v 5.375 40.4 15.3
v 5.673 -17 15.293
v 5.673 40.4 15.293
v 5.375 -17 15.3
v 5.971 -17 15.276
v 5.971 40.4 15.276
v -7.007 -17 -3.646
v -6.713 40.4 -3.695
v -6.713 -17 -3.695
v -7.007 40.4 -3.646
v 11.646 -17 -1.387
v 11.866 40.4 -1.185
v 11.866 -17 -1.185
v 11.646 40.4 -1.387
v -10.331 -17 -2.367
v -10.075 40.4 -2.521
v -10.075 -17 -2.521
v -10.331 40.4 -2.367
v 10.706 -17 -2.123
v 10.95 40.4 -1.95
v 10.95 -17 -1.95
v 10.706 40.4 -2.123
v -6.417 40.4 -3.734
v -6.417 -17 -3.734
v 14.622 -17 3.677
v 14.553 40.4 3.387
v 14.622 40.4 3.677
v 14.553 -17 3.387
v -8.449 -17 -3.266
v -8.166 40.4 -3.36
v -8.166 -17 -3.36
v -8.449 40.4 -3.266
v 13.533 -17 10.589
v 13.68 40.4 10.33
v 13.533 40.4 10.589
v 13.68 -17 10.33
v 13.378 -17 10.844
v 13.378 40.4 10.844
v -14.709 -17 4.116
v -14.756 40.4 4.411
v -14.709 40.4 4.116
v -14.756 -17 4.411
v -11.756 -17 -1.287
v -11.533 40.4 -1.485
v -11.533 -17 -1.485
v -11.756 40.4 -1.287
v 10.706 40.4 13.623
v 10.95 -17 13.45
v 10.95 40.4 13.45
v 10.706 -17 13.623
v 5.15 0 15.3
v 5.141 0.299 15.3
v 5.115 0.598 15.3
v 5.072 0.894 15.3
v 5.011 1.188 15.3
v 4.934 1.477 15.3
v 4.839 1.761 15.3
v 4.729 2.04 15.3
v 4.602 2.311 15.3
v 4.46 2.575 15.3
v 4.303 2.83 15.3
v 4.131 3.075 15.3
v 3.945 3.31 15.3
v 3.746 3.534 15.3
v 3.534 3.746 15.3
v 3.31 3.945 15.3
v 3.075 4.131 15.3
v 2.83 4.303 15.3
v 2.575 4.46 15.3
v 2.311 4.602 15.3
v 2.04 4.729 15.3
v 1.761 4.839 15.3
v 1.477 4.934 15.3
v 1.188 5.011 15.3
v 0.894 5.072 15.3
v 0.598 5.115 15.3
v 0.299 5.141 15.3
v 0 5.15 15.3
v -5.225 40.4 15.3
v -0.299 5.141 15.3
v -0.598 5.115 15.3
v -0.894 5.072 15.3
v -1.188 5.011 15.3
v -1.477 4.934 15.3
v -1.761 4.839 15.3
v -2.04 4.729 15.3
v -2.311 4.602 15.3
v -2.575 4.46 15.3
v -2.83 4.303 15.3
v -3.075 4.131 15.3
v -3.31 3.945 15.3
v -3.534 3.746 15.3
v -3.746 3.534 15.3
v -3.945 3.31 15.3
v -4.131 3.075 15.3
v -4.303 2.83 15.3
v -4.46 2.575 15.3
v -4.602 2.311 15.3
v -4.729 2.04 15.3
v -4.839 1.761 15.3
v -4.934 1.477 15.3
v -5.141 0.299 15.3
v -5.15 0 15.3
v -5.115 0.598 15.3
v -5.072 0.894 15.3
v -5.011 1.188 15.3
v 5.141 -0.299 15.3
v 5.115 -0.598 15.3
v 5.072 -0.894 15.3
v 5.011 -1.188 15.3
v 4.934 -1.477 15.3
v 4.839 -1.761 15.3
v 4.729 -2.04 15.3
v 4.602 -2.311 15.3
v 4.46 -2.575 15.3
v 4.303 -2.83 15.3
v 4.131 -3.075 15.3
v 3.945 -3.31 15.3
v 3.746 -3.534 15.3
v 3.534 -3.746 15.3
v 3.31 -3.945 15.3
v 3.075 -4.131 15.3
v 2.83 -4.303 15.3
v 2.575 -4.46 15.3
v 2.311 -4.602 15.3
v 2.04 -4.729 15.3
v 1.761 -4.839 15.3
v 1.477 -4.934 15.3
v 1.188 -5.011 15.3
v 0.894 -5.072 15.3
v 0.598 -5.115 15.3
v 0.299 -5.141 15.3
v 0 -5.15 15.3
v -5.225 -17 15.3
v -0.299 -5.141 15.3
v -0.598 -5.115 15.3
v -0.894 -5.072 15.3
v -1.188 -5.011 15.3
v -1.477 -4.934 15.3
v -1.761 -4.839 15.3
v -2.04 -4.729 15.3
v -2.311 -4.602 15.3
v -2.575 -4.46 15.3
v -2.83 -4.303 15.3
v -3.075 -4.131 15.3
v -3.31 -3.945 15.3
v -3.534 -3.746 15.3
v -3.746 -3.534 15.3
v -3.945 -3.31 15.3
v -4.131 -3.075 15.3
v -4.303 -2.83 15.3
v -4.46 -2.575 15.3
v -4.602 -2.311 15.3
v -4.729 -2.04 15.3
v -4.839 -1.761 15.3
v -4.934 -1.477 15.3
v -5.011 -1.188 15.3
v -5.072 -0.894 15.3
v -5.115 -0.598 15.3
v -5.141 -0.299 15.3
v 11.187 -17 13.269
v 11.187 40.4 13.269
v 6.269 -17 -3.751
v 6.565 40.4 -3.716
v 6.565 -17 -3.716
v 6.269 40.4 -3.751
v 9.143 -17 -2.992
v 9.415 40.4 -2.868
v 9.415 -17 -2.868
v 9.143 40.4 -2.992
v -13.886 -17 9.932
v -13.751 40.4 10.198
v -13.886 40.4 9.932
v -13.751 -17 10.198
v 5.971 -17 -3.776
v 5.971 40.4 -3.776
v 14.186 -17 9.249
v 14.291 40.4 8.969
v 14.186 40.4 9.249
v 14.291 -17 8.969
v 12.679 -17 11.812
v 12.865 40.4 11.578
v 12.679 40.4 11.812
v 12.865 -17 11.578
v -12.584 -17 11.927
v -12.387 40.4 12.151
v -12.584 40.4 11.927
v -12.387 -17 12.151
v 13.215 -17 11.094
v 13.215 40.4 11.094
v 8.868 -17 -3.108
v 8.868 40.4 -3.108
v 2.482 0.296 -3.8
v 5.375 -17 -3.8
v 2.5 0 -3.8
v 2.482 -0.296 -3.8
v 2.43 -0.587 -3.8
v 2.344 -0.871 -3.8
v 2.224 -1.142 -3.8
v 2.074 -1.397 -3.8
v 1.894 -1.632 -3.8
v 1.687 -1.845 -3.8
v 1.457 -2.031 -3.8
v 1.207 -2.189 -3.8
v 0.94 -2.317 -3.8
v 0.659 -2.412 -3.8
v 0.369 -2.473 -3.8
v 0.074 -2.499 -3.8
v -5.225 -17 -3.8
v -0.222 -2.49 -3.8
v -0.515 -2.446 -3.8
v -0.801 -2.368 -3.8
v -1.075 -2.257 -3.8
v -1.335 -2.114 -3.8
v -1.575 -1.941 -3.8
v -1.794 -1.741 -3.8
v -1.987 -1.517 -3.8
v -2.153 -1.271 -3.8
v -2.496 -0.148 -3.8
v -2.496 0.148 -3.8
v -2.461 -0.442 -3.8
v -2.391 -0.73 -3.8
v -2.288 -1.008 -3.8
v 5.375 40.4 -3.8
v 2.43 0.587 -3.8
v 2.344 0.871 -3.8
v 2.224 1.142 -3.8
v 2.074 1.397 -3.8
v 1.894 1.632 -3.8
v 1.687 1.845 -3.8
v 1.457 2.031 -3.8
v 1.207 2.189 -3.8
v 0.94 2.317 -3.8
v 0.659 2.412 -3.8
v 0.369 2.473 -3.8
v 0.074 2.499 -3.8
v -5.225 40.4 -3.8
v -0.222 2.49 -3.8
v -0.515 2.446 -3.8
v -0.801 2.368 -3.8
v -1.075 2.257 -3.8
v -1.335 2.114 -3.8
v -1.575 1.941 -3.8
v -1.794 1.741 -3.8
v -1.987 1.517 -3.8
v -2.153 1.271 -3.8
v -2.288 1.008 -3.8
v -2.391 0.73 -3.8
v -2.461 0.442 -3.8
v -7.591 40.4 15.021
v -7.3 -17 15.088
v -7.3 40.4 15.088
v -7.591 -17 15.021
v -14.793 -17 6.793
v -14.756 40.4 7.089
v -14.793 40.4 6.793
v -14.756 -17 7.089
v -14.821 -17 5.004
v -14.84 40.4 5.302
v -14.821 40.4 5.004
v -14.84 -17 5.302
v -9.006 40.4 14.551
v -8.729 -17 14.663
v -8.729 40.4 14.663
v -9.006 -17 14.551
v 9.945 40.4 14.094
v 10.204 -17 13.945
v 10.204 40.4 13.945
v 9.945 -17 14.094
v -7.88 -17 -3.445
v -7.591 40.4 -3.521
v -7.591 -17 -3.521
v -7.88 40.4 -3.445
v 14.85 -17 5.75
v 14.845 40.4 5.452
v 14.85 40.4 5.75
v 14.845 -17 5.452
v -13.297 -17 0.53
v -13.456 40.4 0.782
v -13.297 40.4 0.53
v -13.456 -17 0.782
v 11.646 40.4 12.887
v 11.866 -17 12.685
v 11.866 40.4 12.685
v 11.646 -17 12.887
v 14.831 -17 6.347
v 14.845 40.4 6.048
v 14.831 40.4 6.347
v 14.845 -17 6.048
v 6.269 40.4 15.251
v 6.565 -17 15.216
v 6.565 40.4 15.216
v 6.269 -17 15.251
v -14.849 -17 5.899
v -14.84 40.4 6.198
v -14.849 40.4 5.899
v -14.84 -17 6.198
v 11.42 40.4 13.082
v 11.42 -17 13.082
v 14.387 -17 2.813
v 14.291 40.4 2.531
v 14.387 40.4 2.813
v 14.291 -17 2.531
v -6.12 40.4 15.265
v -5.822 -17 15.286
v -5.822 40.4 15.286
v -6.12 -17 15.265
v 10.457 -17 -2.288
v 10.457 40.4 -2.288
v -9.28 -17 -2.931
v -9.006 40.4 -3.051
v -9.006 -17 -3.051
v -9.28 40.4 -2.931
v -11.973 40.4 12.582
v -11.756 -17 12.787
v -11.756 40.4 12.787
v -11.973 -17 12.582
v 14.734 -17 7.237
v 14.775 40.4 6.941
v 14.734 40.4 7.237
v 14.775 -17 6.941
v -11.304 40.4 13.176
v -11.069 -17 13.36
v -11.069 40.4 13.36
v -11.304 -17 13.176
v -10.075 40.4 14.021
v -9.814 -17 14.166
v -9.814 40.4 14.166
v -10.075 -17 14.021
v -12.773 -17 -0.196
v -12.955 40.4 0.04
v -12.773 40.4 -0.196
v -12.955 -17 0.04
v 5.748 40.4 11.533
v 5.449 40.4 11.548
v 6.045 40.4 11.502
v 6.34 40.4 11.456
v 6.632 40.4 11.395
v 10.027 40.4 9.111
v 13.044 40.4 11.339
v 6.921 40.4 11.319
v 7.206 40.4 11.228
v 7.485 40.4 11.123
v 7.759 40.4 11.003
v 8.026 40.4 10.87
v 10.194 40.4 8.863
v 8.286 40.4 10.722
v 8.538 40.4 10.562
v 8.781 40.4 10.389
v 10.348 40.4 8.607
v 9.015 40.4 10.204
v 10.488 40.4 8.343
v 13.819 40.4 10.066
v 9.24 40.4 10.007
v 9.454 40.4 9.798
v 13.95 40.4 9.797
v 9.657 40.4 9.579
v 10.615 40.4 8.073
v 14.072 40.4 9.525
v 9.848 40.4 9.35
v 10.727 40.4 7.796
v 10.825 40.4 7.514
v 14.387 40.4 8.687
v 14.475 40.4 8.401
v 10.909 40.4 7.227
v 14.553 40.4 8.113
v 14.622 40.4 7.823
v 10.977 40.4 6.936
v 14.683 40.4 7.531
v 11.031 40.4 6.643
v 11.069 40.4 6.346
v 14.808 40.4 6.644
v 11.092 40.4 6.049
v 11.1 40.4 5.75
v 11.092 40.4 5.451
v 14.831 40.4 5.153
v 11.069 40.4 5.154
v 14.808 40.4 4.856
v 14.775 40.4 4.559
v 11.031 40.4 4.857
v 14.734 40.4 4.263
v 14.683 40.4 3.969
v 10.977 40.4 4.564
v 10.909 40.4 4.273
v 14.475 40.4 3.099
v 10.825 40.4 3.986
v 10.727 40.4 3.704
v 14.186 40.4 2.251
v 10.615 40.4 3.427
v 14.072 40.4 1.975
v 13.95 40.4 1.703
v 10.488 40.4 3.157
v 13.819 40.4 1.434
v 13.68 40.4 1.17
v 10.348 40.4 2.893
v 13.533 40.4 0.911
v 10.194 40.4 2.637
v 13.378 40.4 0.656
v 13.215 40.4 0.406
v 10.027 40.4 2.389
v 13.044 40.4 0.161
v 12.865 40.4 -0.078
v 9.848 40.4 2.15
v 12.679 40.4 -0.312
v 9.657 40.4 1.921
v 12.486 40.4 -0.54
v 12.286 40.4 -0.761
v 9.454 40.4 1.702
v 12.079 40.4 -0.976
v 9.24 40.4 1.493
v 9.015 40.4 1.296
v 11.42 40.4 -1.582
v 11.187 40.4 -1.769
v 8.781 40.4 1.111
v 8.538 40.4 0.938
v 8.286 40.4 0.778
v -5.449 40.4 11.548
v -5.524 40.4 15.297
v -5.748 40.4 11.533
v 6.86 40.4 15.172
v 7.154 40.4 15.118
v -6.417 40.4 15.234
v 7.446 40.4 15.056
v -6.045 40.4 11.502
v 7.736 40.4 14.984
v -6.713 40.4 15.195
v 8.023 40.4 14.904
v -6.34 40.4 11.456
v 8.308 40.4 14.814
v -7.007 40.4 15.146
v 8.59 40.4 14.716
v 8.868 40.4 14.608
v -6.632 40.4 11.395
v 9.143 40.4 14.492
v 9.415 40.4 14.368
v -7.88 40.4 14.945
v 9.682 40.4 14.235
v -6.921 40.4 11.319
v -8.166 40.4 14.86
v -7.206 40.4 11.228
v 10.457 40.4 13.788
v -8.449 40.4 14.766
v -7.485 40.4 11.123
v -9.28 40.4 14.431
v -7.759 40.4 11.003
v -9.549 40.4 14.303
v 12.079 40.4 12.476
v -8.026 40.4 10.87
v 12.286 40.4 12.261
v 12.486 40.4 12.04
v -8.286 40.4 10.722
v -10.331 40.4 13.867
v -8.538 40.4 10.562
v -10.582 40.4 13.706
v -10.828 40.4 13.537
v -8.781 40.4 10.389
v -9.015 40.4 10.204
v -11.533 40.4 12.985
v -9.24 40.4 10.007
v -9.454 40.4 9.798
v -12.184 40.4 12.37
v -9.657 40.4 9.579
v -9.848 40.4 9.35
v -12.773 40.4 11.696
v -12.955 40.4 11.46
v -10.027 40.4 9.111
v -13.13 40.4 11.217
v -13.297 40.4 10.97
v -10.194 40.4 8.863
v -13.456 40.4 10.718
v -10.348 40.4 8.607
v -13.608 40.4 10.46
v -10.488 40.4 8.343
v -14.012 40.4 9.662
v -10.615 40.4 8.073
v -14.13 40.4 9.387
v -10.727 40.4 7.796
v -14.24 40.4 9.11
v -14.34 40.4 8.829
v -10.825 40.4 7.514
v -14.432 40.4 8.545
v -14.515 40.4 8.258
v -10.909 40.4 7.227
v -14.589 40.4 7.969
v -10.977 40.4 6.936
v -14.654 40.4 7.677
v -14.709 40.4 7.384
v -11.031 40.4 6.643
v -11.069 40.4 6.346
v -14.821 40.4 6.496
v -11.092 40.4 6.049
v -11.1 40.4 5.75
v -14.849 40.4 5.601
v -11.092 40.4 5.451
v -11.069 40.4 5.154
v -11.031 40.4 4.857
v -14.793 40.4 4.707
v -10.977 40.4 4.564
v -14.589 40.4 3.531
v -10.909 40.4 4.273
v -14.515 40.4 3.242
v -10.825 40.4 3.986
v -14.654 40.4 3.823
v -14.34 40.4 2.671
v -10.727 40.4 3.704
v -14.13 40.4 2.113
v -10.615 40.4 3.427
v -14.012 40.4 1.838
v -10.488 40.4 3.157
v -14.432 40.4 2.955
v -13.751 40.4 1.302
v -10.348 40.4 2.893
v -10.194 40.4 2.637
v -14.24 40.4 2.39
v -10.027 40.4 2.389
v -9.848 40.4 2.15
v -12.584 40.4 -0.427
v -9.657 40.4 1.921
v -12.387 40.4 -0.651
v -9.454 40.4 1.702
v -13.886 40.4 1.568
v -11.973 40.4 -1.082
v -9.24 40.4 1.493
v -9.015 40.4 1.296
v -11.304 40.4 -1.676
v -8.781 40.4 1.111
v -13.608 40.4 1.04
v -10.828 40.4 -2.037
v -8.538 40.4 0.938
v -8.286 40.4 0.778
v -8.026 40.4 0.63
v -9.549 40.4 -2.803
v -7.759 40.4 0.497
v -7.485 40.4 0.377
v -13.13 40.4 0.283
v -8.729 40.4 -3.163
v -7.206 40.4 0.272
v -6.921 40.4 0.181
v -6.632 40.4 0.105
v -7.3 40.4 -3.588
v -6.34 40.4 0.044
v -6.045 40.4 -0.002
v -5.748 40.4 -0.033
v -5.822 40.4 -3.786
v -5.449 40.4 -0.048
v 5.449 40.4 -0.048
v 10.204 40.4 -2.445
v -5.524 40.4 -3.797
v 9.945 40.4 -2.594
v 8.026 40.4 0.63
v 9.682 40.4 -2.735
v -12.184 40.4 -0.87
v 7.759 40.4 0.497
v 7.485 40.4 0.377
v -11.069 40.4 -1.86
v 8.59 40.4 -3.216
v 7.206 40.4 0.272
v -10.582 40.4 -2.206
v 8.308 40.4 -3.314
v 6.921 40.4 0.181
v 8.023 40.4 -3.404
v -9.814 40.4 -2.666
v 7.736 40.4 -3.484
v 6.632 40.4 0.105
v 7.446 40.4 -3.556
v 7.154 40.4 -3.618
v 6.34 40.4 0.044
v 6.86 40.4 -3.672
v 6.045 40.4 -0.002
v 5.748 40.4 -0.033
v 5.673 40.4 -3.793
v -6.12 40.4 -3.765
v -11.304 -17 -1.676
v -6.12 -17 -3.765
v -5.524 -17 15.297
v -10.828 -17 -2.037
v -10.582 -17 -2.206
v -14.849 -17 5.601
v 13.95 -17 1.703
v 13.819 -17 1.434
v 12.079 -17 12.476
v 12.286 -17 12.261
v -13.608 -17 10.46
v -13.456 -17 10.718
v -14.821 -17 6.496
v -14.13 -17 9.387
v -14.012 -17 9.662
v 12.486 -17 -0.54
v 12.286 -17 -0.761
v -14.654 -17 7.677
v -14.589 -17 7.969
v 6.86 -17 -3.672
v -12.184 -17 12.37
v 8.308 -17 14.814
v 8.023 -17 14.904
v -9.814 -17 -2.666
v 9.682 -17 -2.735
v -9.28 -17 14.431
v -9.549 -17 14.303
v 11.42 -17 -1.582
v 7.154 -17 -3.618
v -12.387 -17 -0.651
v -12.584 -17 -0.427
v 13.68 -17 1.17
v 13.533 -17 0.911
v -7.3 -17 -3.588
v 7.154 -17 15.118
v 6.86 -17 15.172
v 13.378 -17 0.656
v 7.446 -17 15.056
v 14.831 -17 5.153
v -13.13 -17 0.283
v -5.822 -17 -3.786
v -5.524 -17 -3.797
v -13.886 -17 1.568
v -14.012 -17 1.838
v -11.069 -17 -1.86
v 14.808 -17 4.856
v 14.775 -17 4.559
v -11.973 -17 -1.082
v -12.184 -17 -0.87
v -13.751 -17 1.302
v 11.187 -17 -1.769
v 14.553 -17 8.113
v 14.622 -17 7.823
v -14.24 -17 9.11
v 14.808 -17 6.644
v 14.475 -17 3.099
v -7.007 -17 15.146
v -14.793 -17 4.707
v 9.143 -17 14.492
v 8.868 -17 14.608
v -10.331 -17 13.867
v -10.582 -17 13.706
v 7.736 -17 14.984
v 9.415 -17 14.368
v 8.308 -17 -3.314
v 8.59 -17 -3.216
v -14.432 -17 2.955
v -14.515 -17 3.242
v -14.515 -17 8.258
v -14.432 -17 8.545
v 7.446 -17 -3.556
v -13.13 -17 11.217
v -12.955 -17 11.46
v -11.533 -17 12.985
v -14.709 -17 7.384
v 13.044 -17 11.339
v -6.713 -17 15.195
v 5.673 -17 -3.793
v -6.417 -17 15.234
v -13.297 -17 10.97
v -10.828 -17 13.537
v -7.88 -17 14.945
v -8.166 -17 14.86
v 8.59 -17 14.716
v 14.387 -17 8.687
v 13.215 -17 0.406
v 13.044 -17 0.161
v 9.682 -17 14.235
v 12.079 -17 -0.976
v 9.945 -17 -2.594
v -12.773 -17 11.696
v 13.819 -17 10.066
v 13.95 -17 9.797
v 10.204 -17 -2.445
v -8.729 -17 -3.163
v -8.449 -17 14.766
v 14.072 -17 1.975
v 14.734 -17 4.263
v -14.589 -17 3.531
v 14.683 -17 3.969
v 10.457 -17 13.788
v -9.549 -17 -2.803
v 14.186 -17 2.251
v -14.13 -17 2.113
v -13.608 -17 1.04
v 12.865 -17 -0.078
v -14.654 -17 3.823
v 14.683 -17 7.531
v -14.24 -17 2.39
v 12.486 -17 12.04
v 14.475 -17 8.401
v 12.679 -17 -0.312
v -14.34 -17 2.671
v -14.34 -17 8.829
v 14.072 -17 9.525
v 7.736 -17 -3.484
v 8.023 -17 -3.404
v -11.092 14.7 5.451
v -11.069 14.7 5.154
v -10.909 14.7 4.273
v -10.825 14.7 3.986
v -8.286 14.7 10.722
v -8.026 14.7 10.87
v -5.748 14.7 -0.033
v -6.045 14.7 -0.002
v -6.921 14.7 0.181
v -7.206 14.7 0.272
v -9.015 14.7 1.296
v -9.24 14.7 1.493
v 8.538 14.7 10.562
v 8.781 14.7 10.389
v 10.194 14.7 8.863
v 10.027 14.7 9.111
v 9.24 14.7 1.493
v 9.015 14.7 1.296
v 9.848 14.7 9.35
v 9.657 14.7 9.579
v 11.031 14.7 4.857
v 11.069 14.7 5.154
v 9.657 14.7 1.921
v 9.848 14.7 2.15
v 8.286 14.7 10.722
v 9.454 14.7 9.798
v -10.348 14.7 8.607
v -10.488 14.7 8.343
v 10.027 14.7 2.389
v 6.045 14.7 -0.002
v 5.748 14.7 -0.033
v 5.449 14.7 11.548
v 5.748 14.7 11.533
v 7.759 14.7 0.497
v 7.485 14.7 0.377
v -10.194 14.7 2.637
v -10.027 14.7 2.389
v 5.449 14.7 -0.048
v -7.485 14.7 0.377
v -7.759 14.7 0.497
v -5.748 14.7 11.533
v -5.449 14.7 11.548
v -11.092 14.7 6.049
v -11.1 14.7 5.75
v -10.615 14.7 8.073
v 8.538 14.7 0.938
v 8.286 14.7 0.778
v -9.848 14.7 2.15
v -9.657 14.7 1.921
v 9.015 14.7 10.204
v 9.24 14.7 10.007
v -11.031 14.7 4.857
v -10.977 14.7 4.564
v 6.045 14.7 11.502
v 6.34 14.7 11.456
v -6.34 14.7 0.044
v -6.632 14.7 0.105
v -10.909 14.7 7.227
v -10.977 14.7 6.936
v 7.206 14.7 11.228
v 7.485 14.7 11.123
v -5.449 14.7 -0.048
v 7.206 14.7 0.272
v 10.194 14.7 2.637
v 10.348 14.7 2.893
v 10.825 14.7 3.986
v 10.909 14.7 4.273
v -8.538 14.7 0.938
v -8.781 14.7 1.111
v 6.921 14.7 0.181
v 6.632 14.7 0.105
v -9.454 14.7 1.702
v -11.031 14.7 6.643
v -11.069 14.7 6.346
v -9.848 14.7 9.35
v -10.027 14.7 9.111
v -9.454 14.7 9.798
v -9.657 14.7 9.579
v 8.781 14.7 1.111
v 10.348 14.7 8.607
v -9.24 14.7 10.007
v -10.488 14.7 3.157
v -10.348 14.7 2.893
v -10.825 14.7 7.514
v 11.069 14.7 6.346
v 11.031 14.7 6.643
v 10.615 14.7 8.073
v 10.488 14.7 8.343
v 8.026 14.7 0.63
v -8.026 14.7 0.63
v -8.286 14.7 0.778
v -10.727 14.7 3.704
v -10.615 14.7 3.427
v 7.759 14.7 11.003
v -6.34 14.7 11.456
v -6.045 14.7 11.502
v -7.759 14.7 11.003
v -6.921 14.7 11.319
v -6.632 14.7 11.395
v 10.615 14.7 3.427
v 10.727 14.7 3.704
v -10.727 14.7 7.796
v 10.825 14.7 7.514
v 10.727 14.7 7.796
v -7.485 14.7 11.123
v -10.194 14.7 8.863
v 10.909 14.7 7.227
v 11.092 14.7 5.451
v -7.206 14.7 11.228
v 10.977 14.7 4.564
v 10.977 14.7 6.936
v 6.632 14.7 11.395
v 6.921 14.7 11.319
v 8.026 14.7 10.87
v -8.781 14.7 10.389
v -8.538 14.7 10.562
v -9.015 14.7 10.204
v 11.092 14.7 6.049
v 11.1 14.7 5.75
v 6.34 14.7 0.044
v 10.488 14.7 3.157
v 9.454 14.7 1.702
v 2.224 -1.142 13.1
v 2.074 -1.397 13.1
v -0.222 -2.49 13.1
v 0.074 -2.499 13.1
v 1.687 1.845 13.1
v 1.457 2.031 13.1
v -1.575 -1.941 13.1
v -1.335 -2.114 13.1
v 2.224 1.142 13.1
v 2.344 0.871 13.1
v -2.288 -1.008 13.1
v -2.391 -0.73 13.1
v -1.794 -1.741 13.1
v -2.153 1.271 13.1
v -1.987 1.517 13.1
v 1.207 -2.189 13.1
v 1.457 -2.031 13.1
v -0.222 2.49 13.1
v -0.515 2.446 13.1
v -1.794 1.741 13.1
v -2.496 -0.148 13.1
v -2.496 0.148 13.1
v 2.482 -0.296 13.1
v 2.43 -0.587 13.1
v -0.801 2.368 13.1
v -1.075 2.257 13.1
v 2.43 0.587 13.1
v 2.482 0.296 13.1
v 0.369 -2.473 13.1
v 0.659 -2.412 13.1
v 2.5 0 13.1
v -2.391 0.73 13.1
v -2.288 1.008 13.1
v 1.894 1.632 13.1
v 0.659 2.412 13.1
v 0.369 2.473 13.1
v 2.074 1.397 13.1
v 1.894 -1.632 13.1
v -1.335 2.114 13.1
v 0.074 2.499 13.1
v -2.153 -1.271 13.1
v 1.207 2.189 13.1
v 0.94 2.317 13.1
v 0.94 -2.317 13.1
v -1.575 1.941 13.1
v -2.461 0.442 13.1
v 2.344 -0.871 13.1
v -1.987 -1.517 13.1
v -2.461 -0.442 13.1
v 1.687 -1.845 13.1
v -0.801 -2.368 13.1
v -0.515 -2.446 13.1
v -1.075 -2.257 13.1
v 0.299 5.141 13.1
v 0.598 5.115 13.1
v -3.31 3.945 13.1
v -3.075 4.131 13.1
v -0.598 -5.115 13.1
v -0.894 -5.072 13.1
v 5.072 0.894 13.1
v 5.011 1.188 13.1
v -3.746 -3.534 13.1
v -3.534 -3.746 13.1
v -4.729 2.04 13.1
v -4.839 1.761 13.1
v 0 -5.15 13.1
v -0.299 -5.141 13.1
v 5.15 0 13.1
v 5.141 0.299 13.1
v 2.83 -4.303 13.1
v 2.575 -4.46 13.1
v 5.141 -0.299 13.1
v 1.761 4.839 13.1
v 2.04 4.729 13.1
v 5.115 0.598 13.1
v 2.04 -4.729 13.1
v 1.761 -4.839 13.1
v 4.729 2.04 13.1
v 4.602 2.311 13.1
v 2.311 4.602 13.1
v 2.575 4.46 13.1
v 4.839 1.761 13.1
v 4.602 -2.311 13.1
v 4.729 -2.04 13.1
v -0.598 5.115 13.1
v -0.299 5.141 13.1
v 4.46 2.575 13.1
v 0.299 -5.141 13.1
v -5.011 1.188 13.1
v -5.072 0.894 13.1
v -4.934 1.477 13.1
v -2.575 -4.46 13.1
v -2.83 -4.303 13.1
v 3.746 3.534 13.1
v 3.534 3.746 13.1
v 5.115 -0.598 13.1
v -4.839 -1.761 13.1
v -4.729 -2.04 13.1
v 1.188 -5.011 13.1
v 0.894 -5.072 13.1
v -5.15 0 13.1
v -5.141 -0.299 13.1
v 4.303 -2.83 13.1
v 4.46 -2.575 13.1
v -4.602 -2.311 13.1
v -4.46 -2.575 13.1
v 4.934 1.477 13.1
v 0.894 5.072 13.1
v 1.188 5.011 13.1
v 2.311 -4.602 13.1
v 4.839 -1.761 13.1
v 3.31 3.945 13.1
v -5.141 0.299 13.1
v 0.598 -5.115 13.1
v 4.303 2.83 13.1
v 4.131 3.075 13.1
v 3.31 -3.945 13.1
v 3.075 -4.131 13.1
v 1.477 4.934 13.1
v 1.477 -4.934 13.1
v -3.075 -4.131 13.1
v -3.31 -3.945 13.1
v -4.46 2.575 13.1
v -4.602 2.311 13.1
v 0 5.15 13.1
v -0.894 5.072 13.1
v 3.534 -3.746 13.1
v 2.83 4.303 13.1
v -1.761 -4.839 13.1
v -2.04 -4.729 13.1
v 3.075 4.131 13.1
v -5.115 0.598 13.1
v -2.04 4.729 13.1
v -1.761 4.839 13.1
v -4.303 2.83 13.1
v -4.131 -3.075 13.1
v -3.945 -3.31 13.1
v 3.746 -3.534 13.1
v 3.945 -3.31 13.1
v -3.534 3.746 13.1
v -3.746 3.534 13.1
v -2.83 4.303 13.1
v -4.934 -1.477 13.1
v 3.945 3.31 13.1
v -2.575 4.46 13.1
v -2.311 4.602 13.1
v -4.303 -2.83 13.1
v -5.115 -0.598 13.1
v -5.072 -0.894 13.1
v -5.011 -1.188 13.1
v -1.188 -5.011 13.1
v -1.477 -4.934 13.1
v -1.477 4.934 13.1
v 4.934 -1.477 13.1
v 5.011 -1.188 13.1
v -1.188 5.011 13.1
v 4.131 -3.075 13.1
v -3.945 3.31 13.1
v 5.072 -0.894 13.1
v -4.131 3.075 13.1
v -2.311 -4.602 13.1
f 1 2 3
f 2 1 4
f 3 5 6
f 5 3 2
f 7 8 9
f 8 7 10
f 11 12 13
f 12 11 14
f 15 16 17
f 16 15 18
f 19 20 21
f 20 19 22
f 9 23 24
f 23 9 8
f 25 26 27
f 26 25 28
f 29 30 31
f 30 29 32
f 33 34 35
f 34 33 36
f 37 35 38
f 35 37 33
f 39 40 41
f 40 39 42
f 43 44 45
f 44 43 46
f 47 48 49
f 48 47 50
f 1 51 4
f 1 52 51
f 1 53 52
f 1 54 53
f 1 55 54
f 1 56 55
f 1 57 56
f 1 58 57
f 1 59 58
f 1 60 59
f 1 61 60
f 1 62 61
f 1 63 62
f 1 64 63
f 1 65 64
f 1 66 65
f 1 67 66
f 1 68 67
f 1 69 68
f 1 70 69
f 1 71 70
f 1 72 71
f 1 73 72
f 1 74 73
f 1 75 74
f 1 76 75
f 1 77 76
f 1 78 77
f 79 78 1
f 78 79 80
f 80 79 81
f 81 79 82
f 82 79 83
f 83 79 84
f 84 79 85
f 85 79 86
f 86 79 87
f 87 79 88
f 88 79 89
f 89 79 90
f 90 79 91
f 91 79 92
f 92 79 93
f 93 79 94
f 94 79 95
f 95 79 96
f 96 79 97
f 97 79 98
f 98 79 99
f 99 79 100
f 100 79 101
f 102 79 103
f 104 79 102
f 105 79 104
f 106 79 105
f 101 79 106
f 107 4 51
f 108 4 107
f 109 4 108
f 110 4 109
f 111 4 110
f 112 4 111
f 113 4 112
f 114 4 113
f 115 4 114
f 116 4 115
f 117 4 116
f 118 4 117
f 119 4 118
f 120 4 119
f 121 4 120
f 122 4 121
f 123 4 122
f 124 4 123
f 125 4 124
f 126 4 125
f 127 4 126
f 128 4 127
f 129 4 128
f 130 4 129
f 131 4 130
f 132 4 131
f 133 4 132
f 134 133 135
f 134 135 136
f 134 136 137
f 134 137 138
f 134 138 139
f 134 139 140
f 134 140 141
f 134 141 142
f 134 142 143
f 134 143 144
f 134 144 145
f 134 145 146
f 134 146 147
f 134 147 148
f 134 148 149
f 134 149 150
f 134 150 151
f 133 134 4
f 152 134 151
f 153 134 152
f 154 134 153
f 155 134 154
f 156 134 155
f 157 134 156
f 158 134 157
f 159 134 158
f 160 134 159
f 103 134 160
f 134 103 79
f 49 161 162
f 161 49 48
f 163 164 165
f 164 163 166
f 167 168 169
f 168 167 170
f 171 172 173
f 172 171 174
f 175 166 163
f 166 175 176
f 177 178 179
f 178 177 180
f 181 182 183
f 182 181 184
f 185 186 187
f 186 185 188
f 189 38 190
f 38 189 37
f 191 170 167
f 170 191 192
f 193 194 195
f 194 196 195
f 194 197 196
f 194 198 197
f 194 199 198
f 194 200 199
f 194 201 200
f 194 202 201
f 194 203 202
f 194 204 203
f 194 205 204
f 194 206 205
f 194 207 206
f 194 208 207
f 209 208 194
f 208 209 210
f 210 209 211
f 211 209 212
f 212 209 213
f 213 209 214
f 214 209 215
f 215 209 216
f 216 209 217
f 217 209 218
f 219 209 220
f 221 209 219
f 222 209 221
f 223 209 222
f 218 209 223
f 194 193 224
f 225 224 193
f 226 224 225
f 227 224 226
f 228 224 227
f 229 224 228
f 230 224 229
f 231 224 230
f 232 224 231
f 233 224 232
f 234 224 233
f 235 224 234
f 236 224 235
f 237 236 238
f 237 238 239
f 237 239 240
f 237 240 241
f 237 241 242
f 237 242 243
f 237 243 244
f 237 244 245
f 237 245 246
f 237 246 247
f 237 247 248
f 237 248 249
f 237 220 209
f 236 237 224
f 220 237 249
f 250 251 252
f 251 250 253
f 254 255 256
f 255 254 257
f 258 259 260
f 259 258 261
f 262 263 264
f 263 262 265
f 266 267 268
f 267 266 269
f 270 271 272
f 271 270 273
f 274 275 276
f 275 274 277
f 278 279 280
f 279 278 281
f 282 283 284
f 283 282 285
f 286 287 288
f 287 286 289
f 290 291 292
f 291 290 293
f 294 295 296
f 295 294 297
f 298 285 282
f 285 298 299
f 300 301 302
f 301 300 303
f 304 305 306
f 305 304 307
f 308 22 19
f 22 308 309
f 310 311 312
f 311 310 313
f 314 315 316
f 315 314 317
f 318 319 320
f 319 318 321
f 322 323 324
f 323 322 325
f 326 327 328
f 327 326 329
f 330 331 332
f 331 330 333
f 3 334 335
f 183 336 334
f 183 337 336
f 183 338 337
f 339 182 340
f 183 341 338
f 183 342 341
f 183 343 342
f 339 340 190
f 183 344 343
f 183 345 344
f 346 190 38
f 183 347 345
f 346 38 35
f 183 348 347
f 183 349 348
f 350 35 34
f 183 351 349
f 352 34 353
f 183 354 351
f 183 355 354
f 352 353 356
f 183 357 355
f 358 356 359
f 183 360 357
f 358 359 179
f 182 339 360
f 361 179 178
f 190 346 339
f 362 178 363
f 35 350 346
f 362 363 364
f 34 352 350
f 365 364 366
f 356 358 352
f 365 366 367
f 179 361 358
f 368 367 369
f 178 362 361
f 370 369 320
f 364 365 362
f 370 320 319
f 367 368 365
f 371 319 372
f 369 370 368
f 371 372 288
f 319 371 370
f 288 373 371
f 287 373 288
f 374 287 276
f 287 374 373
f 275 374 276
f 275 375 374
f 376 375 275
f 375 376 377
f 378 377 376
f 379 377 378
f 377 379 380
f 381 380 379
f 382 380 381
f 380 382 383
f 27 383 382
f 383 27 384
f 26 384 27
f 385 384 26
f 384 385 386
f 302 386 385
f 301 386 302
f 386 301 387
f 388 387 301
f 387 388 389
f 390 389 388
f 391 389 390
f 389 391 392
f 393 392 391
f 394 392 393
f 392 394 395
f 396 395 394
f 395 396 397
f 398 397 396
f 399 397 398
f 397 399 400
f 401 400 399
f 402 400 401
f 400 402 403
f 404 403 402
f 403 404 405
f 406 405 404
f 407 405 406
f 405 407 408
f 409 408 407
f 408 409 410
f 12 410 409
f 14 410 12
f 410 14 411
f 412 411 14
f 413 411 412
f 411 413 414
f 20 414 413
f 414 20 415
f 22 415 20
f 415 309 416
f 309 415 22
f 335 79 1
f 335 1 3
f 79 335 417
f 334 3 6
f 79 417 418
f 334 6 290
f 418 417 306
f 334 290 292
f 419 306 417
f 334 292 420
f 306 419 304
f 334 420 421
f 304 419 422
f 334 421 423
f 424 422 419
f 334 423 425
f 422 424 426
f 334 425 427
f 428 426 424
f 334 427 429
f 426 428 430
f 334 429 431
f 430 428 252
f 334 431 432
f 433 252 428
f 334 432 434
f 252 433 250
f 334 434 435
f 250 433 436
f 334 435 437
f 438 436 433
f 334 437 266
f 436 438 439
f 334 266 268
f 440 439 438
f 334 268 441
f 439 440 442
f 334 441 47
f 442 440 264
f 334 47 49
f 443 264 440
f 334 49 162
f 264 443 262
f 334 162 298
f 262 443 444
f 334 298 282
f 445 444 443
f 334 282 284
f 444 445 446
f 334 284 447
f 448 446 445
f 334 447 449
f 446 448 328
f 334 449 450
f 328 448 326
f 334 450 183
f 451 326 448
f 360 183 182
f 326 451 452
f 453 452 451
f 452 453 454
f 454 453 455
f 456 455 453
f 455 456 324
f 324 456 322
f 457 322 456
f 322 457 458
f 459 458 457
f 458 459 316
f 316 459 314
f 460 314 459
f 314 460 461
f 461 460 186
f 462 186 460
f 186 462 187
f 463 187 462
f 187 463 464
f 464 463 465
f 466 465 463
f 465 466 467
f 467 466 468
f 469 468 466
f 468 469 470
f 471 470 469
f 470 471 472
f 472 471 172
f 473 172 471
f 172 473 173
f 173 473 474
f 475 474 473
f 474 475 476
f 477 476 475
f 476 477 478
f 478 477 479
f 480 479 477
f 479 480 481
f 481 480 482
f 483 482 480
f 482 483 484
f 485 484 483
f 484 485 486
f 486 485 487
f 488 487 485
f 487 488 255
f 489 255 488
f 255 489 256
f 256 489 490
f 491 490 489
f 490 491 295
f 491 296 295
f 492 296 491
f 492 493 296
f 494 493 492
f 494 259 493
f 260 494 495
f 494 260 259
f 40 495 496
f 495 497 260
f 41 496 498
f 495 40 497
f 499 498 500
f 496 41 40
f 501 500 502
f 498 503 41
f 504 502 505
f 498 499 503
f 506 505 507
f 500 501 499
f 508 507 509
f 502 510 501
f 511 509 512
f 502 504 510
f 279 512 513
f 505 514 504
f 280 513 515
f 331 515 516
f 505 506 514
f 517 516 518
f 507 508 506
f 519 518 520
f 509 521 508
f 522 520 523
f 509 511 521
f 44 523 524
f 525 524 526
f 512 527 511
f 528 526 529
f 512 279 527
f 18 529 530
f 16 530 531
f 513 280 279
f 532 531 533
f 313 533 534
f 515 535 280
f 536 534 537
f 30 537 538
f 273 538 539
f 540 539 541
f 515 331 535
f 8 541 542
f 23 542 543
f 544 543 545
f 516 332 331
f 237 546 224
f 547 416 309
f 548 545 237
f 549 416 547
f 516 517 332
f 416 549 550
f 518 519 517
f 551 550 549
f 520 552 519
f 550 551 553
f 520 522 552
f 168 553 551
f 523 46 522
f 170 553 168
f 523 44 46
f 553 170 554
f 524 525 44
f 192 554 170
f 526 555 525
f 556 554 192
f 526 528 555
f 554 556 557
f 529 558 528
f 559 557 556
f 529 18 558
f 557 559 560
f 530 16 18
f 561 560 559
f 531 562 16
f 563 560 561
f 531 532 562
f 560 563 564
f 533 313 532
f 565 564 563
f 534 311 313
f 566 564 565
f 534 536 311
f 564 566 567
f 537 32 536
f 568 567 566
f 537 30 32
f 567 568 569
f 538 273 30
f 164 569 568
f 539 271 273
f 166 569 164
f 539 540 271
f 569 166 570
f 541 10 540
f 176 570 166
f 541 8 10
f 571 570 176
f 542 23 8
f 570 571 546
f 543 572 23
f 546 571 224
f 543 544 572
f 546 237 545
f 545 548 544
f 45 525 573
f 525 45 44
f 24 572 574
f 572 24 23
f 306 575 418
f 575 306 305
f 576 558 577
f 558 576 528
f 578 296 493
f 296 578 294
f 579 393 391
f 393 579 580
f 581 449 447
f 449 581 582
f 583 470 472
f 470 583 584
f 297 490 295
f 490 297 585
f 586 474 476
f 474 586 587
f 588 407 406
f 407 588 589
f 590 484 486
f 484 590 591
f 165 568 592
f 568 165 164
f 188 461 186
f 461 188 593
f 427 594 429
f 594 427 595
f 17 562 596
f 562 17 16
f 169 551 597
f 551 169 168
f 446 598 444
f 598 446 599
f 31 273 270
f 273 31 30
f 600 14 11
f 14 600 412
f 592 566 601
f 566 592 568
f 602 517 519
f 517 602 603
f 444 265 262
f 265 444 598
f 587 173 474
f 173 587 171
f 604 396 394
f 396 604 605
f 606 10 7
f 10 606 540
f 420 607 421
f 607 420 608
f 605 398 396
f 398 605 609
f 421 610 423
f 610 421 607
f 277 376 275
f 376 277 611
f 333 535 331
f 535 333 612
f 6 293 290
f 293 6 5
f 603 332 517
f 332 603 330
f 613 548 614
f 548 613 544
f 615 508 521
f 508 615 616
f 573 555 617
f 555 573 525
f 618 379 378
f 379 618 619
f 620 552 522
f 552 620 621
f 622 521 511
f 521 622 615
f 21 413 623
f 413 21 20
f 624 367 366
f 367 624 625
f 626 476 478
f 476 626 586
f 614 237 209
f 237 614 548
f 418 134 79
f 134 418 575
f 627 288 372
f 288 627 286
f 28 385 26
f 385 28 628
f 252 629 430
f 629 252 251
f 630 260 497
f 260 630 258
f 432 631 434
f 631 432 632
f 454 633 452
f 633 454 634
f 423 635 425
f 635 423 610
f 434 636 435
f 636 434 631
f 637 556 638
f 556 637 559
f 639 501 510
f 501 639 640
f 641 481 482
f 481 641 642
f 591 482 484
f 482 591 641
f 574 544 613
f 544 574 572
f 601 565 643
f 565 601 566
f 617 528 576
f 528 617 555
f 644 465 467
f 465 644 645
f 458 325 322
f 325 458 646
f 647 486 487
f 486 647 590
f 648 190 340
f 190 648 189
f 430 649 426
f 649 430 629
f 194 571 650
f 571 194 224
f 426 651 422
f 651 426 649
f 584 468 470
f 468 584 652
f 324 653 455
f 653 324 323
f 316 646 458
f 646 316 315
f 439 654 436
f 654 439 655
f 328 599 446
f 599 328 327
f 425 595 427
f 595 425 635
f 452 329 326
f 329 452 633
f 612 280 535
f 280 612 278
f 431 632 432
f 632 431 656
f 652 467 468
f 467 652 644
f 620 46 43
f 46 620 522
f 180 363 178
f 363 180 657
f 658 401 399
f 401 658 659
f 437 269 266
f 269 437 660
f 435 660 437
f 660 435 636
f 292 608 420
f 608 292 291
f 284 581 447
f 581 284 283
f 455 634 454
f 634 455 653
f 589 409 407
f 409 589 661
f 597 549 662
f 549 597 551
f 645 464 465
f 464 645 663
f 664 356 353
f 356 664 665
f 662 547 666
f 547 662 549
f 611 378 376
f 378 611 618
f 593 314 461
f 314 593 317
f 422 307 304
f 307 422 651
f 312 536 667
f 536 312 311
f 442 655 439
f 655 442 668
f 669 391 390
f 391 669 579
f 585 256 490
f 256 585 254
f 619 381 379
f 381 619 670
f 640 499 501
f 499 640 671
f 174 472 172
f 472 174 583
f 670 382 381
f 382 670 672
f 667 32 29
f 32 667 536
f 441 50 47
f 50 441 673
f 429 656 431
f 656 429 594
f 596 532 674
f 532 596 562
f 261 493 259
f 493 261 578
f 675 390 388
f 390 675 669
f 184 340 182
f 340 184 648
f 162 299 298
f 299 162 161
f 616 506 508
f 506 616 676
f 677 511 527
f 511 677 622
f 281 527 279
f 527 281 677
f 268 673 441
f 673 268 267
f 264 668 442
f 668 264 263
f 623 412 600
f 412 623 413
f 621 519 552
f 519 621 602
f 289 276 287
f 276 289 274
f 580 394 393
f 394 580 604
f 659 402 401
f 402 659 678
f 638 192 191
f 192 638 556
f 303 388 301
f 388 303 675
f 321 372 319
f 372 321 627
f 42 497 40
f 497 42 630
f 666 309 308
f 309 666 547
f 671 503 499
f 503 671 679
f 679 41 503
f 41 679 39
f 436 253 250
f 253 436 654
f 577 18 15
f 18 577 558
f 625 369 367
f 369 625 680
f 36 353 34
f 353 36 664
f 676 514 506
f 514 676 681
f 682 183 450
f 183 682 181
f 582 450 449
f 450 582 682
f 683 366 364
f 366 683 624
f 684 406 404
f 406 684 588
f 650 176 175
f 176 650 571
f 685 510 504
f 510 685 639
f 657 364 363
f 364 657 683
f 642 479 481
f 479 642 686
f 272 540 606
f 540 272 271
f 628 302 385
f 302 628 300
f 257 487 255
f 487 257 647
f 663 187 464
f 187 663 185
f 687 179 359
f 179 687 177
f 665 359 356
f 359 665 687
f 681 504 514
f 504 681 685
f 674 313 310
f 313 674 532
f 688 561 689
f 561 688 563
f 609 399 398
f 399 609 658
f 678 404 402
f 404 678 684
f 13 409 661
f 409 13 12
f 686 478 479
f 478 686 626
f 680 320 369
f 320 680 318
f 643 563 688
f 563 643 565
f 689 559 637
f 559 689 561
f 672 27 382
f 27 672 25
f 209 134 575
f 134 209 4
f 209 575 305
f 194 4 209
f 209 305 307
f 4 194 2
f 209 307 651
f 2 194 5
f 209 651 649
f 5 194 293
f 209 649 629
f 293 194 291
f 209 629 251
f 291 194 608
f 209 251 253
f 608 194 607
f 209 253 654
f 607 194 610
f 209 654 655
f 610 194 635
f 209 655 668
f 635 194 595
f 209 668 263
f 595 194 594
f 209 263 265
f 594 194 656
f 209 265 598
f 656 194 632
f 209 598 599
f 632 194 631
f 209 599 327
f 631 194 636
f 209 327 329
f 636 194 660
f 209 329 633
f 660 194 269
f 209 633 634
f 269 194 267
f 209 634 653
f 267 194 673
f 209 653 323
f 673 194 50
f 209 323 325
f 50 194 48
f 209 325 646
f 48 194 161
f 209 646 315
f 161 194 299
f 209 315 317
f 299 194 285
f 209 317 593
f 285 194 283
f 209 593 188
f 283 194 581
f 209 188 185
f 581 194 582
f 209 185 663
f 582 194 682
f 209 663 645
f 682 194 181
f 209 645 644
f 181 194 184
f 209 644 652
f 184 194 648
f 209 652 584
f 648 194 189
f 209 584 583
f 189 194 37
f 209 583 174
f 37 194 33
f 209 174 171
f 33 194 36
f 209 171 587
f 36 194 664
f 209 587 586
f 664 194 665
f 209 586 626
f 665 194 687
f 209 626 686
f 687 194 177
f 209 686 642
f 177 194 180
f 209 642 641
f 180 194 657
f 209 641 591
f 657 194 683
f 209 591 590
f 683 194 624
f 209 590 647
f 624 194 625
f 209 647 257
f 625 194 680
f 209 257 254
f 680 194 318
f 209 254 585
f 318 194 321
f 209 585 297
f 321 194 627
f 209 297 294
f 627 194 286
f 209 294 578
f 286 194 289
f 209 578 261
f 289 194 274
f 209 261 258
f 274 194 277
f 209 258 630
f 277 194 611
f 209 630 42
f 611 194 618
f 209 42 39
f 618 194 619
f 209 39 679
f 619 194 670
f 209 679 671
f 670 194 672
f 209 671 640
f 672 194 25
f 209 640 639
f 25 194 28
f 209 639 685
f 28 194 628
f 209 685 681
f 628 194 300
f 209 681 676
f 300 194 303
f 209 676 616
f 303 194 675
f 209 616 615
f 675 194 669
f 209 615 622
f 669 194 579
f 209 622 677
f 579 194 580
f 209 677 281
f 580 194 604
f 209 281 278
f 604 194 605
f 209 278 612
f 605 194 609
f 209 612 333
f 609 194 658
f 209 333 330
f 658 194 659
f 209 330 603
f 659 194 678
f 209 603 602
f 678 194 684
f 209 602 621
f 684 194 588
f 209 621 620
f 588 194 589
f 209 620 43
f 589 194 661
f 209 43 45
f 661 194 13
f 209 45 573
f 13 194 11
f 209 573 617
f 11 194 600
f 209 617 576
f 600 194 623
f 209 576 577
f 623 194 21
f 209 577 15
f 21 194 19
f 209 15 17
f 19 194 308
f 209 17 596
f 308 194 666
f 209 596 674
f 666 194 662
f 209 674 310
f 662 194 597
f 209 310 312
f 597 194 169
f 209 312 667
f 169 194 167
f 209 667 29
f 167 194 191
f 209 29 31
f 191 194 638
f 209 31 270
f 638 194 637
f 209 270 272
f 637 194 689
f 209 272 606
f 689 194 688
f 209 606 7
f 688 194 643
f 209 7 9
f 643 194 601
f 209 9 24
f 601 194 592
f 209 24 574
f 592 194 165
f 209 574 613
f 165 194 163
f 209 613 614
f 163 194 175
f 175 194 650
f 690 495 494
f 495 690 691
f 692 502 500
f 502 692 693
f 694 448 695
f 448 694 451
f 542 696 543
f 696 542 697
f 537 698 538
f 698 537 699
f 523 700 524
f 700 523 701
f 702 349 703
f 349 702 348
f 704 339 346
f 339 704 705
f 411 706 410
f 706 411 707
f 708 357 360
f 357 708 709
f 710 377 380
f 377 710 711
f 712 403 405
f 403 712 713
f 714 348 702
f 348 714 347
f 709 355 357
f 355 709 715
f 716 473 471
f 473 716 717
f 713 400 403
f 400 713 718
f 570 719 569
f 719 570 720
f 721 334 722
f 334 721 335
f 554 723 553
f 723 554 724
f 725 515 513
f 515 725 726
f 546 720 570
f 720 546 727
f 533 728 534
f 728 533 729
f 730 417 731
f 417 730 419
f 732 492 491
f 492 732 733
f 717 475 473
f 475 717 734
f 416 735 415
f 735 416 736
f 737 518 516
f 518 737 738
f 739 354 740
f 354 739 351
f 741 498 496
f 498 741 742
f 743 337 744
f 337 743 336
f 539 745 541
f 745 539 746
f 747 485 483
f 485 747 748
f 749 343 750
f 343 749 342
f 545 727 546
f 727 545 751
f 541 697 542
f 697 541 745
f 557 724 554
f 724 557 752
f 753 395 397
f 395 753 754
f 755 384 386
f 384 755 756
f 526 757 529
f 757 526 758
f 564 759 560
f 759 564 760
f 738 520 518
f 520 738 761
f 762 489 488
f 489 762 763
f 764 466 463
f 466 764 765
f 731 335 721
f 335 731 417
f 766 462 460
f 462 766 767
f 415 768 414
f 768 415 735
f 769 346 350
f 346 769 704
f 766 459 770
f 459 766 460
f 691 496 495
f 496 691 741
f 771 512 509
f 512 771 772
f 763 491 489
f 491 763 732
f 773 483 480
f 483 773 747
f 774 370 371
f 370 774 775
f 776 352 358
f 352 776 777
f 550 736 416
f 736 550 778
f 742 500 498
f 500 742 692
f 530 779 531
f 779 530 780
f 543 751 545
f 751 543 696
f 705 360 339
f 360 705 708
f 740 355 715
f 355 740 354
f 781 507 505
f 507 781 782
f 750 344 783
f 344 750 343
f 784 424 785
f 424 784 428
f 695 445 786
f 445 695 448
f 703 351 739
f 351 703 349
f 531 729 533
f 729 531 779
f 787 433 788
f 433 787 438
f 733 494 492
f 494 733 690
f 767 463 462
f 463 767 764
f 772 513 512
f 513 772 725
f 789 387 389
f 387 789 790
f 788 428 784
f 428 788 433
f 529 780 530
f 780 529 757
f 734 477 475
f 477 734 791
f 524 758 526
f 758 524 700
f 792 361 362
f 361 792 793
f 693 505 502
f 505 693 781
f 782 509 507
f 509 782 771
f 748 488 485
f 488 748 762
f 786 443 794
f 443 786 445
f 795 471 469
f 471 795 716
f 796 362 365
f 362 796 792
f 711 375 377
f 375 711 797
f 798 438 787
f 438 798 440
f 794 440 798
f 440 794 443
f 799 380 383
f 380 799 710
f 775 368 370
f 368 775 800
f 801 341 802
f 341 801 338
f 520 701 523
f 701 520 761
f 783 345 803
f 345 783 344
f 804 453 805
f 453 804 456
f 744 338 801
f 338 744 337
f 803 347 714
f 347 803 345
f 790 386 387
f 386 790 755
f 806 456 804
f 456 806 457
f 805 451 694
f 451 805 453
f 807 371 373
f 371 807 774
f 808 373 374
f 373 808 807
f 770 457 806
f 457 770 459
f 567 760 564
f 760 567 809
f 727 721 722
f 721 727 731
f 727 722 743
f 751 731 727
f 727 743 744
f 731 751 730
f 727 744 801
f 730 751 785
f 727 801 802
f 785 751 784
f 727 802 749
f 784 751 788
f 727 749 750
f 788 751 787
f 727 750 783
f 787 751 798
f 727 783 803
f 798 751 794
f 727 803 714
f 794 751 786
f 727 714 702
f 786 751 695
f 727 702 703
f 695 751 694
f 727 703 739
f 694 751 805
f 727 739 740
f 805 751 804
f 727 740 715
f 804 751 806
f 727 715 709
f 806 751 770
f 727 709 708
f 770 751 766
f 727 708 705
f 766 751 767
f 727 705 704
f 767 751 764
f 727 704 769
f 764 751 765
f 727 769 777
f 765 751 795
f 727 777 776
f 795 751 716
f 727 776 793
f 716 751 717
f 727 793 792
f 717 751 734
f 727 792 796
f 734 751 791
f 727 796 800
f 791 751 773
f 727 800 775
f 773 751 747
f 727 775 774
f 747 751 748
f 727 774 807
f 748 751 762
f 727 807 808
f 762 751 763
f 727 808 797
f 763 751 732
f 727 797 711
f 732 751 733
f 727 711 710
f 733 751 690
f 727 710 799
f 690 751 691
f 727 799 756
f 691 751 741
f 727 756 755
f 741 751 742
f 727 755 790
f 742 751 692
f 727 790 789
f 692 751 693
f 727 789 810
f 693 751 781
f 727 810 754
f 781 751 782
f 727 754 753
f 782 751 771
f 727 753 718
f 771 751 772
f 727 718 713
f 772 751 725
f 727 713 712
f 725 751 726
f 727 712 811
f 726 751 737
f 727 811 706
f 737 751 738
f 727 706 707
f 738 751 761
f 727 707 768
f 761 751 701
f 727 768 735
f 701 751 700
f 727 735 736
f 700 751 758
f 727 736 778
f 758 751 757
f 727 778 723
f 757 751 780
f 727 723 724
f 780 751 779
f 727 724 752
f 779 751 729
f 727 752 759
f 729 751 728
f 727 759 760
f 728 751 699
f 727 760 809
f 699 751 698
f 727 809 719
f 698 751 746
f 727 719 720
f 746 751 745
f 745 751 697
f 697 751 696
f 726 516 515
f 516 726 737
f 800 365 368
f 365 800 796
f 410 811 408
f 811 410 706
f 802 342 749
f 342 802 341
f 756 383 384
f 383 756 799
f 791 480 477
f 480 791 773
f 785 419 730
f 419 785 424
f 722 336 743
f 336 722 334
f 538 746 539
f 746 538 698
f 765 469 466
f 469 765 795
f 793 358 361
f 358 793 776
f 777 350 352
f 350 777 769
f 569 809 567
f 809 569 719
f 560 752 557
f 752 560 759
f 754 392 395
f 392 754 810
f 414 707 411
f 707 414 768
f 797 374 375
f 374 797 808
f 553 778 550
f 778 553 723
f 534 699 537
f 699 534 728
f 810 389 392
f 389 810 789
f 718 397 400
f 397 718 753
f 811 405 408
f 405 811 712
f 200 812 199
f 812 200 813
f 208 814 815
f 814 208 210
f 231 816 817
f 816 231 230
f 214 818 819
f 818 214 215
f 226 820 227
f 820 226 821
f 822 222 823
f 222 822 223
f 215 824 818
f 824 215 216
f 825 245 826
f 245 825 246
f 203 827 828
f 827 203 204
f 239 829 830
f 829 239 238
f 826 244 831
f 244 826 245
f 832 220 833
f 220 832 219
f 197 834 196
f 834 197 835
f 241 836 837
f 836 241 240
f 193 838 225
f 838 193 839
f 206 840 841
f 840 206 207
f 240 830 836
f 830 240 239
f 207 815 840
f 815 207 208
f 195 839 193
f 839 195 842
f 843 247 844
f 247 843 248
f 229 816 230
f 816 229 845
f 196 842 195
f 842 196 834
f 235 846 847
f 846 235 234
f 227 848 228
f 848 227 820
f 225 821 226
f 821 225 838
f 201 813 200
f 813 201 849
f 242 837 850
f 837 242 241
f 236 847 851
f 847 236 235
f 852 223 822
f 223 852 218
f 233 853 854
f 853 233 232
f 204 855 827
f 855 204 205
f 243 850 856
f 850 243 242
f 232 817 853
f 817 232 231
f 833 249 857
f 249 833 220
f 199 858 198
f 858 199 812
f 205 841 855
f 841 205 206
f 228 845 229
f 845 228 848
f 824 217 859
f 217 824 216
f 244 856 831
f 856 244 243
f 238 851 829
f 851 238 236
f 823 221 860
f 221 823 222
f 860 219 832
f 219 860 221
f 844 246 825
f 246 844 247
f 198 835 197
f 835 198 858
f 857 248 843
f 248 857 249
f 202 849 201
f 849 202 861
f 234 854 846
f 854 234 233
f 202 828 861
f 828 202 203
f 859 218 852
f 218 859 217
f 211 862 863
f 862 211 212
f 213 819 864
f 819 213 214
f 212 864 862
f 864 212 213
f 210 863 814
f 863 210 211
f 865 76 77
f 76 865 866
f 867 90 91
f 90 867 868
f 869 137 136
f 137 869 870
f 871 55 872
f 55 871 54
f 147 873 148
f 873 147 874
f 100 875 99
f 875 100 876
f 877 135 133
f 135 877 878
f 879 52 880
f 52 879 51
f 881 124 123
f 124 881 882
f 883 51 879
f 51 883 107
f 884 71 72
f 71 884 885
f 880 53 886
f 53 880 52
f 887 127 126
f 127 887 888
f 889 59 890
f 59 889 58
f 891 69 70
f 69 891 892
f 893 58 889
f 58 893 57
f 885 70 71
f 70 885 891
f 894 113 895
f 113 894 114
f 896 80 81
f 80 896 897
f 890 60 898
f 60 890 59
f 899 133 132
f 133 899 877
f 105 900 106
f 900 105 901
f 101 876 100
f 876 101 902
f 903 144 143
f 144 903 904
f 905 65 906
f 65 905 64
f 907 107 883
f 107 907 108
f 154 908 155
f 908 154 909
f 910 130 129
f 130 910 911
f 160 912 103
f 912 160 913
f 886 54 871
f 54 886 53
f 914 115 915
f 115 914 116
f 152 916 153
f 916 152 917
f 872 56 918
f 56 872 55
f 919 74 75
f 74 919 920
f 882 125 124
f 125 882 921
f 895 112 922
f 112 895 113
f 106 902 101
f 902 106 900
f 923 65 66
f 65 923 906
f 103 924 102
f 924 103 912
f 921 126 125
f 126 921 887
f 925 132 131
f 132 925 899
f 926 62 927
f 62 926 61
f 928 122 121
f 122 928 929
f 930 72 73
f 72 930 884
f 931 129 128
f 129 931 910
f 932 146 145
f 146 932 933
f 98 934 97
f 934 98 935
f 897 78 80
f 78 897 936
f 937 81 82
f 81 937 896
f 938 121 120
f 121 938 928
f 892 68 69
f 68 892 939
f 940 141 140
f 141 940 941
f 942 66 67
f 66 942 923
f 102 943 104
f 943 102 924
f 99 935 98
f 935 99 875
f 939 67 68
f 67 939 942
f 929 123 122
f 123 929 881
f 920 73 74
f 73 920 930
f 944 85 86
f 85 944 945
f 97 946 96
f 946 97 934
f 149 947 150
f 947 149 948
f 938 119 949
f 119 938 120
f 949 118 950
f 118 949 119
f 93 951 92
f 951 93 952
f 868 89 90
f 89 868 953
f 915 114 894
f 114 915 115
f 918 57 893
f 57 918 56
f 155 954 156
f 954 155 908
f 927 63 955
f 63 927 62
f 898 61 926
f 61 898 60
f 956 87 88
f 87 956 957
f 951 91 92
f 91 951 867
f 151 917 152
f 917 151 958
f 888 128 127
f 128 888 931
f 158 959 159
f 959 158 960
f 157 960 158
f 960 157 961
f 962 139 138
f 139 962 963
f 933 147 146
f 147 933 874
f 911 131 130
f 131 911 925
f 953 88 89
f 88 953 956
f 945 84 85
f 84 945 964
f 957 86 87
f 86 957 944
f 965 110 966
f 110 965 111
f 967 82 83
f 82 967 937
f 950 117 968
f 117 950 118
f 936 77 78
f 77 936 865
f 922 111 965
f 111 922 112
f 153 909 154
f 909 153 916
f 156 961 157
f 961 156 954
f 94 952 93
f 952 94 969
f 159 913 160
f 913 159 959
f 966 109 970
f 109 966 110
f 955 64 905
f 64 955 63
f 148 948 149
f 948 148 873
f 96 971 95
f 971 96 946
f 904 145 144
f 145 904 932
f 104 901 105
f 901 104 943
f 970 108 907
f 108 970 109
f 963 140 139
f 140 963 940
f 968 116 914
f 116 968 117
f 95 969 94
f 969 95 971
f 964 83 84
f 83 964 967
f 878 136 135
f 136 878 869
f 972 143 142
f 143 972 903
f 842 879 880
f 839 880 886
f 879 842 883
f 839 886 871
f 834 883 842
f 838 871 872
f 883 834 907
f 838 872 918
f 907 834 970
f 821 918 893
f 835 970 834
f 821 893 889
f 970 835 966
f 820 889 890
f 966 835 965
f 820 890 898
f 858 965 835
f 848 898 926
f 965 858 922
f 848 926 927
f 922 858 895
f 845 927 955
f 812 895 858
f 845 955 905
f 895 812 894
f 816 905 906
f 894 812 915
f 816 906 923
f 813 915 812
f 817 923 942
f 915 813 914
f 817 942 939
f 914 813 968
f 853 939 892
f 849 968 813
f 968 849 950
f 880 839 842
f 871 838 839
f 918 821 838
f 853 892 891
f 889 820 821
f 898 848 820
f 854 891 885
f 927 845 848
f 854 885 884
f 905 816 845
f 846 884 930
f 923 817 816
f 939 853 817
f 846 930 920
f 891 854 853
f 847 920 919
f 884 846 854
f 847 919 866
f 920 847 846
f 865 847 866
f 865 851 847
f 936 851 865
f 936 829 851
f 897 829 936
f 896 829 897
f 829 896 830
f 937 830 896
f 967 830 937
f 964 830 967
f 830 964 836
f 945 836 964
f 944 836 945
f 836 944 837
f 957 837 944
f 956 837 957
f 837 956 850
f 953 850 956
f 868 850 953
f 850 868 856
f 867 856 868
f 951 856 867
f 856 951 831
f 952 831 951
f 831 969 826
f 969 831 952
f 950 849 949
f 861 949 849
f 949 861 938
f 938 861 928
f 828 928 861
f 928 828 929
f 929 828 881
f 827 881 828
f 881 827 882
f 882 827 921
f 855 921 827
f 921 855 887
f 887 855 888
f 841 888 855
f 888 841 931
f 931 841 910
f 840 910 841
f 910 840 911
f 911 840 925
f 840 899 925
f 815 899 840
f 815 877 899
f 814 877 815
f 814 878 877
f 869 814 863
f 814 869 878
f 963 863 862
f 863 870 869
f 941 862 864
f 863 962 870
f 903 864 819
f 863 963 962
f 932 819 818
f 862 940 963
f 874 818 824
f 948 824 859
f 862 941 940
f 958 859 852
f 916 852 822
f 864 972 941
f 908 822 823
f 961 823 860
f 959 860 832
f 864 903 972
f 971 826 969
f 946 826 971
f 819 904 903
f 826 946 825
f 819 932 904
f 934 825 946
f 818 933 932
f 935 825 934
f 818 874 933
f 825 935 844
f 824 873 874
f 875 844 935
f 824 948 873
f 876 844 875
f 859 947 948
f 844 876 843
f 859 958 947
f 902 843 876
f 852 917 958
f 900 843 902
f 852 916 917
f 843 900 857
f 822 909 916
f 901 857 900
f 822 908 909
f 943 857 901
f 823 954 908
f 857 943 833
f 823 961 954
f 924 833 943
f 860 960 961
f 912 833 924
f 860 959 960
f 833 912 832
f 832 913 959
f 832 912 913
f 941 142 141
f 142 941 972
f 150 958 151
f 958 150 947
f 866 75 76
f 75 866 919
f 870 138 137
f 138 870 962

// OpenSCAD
$fa=.01;
$fs=.3;

pole_d = 11.5;
pole_w = 22.1;
bolt_d = 4.7;
bolthead_d=9.7+.3;
plasticnut_t=5.8-4.2;

block_w = 24.6;
block_l = 34;
block_t1 = 3.8;

hole_to_end=17;
hole_to_shear=15;

new_block_overlap=25.4;

loose=.3;
tight=.1;

module capsule(w,d,h,center=false){
	dx= w/2-d/2;
	hull(){
		translate([-dx,0,0]) cylinder(h=h,d=d, center=center);
		translate([ dx,0,0]) cylinder(h=h,d=d, center=center);
	}
}
module pole(h=99,center=false){
	capsule(w=pole_w,d=pole_d,h=99);
}

difference(){
	//h = pole_d+plasticnut_t+block_t1;
	new_block_h = pole_d+2*block_t1;
	new_block_l = hole_to_end + hole_to_shear + new_block_overlap;
	new_block_w = pole_w+2*block_t1;
	
	%translate([-new_block_w/2,-hole_to_end,-block_t1]) cube([new_block_w,new_block_l,new_block_h]);
	translate([0,-hole_to_end,new_block_h/2-block_t1])
		rotate([-90,0,0])
		capsule(w=new_block_w,d=new_block_h,h=new_block_l);
	
	
	//hole for pole
	translate([0,hole_to_shear-loose,pole_d/2])
		rotate([-90,0,0])
		capsule(w=pole_w+tight,d=pole_d+tight,h=99);
	//bolt hole
	cylinder(h=99,d=bolt_d+loose, center=true);
	//countersink
	translate([0,0,pole_d+plasticnut_t]) cylinder(d=bolthead_d+loose,h=99);
}
